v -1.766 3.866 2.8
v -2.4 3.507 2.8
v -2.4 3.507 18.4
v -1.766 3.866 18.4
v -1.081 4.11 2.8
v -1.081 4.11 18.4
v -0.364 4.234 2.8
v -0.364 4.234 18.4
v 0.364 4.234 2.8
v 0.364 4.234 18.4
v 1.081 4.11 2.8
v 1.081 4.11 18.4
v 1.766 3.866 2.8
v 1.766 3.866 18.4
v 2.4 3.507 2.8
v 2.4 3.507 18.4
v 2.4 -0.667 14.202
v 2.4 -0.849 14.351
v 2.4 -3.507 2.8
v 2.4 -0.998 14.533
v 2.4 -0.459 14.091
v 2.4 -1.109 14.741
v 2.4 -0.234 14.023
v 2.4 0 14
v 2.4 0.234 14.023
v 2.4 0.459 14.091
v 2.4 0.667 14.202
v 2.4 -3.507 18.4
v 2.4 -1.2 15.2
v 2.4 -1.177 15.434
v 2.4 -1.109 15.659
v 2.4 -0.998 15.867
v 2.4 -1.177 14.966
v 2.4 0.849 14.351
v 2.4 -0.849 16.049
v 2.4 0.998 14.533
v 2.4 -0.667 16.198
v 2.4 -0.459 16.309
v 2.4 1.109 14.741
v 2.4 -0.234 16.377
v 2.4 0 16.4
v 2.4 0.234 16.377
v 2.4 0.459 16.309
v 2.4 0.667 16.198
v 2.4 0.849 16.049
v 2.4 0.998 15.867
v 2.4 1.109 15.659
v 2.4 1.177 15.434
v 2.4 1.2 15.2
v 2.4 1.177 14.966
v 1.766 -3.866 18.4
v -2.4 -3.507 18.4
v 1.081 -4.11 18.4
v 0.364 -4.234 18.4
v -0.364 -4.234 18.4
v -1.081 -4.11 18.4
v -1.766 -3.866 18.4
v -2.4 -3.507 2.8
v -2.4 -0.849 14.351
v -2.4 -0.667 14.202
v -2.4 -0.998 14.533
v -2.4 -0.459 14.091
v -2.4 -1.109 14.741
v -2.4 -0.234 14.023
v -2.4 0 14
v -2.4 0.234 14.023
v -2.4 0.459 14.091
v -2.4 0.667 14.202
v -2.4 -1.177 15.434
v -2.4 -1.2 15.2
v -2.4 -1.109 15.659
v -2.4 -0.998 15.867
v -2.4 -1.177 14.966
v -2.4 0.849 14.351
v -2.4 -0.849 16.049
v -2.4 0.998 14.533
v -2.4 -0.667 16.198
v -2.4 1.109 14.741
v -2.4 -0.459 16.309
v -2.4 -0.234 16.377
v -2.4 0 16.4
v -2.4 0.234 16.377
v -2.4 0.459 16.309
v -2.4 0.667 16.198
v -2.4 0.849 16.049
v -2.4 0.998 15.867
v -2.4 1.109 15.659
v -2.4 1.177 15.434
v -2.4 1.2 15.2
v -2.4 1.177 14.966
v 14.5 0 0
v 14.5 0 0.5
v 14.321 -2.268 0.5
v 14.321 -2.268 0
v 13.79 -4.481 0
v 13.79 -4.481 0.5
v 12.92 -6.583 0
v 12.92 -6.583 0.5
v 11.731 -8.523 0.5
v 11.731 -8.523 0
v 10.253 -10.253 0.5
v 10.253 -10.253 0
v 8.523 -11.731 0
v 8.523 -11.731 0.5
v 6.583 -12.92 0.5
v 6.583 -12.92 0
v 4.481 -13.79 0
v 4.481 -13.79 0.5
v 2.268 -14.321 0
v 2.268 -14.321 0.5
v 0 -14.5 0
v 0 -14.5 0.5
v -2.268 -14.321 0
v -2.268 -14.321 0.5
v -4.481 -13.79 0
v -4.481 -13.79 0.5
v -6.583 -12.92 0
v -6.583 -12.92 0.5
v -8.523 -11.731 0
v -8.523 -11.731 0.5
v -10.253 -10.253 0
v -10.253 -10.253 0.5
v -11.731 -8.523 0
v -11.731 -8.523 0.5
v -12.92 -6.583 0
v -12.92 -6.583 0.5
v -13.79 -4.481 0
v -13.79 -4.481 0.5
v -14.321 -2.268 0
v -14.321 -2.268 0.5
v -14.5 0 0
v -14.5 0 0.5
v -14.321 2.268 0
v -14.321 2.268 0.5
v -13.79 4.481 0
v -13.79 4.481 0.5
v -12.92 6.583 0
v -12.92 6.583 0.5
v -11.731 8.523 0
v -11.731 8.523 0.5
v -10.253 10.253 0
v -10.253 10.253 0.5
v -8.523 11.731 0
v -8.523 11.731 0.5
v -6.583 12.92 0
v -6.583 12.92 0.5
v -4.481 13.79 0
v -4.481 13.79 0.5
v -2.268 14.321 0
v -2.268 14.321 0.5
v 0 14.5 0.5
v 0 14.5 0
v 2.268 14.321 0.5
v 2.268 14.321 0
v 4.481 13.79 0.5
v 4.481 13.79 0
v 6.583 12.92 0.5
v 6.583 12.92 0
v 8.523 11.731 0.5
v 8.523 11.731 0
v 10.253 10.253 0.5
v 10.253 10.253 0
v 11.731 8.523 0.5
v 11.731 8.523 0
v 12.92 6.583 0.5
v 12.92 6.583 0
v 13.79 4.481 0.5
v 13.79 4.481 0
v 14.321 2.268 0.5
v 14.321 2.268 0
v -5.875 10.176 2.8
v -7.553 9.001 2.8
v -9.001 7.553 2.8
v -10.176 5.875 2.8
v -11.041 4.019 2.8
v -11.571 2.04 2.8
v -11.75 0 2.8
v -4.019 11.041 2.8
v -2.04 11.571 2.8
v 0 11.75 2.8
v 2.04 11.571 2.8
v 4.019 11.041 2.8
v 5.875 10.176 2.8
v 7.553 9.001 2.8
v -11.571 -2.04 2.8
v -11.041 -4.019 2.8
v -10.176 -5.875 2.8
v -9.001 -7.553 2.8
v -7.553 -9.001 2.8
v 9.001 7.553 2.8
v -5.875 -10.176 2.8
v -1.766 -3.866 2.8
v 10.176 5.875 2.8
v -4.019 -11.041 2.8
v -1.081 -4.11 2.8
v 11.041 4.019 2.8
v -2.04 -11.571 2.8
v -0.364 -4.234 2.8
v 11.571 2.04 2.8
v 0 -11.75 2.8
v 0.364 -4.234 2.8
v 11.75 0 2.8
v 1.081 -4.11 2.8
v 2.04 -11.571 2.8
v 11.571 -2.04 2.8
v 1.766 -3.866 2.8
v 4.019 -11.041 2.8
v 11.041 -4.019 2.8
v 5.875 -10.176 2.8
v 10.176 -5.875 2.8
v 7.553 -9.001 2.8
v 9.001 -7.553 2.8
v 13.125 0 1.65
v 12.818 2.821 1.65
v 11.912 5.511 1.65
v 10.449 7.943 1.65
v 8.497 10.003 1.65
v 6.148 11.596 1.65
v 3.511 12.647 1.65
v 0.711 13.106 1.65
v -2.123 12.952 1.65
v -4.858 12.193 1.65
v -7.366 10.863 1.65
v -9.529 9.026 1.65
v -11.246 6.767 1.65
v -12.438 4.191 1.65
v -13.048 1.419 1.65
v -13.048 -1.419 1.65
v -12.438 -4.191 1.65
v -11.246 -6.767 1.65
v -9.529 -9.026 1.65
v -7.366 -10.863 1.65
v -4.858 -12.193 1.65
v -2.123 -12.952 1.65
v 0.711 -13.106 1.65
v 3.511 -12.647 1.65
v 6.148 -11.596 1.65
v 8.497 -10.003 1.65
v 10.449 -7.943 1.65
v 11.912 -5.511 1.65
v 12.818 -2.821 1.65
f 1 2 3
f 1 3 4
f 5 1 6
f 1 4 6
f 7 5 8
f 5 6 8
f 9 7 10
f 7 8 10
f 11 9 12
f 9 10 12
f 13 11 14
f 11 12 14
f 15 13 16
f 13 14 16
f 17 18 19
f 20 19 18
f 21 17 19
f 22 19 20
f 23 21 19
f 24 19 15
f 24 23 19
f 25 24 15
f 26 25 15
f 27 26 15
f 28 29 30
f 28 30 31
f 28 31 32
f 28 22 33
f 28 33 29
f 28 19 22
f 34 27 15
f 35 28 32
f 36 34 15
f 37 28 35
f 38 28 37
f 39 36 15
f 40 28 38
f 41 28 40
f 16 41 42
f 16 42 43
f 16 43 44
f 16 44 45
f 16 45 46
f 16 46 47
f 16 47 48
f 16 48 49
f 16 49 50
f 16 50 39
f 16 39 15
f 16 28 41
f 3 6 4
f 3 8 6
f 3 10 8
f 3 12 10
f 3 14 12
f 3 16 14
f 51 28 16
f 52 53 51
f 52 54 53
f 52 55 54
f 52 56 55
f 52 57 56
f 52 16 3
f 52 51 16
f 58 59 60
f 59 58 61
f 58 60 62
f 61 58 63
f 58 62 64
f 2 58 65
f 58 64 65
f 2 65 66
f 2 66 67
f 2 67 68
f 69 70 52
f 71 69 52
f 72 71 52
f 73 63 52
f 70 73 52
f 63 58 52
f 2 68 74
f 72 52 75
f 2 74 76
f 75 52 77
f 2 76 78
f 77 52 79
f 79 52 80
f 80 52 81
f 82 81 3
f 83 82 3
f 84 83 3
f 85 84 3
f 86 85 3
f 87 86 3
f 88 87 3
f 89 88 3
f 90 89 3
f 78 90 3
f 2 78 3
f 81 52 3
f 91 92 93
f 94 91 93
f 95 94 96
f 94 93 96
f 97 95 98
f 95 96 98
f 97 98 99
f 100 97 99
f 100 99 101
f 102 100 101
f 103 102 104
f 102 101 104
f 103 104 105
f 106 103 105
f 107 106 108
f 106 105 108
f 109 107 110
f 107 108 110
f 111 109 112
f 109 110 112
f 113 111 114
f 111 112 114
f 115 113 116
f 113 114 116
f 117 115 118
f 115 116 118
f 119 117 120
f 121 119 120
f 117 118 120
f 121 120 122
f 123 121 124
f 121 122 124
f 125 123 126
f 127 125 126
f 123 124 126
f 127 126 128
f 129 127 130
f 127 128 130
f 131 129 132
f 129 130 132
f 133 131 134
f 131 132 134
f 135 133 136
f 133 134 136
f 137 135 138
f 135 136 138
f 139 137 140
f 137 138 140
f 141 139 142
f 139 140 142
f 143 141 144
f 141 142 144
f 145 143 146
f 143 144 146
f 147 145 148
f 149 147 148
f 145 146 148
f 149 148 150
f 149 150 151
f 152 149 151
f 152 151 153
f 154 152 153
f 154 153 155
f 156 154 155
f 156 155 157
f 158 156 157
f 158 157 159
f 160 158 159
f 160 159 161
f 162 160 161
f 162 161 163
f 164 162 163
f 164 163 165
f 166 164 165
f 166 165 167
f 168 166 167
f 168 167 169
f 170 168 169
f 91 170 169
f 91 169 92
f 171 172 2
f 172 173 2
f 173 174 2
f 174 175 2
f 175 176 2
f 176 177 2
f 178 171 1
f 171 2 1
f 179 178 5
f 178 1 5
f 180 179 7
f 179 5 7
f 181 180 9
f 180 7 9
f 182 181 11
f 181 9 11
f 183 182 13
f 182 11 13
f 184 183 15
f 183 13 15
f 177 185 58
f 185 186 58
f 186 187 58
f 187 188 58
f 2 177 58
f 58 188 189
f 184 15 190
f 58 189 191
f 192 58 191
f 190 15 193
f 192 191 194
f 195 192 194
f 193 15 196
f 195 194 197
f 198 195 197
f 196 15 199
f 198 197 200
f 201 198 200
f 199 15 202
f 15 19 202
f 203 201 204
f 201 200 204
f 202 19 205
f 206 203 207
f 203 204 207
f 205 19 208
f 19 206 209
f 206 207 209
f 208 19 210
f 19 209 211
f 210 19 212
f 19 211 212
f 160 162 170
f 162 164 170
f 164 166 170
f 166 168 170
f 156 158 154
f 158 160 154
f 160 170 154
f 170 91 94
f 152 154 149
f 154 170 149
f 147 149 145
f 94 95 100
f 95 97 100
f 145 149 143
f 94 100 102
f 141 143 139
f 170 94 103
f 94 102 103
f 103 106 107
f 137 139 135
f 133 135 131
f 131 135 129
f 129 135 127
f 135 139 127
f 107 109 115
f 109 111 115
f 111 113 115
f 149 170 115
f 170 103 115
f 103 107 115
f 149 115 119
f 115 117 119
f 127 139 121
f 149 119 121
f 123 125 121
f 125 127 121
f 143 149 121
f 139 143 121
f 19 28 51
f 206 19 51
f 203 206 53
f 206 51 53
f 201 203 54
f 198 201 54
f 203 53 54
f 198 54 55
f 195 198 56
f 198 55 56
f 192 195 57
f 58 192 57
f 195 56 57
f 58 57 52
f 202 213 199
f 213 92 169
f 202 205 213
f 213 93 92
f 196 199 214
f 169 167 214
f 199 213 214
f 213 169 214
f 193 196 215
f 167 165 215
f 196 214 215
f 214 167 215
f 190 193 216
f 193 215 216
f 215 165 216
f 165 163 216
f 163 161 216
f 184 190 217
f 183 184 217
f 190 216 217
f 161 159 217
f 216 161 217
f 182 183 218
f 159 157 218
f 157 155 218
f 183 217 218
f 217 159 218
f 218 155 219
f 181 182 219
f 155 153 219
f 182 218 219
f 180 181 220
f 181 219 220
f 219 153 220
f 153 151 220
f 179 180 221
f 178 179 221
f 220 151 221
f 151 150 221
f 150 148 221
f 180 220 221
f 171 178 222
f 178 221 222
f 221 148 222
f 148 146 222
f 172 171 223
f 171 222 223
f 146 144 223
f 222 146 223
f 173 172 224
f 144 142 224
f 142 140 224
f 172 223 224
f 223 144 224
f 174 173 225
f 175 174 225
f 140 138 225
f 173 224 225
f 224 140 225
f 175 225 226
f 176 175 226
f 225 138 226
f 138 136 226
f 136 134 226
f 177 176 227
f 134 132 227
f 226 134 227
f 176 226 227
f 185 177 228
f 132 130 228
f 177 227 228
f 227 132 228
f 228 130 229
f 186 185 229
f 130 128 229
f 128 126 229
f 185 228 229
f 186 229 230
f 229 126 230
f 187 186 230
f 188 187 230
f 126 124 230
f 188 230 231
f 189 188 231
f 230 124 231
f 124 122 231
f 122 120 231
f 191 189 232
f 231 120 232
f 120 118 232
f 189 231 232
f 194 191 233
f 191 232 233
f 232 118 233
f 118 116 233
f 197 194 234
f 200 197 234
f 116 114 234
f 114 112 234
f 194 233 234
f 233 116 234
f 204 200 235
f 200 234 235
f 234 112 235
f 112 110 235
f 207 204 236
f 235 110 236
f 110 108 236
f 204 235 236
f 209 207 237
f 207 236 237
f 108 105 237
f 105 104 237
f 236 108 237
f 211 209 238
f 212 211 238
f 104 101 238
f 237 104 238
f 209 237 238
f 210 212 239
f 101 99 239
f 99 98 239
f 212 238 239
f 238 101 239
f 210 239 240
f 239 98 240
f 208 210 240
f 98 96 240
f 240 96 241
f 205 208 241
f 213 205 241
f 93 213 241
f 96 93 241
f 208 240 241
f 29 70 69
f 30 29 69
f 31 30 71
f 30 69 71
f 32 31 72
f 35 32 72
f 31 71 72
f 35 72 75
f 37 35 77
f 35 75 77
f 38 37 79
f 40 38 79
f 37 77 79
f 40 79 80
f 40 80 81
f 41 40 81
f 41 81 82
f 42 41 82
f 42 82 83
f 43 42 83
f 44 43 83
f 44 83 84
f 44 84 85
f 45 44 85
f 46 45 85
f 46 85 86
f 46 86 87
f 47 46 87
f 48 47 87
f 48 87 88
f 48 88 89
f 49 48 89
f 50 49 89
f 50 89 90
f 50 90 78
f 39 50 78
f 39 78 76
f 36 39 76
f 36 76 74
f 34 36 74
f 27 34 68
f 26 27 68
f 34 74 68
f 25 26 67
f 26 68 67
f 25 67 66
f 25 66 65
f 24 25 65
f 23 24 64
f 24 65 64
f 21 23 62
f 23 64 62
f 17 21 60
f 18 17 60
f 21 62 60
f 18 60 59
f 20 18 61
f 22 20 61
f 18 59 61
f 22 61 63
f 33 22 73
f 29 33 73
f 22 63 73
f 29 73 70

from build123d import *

# Parameters (mm, degrees)
F0_W     = 4.25
F0_H     = 2.8
F0_W_2   = 10.25
F0_H_2   = 15.6
F4_W     = 4.8
F4_H     = 8.5
F5_DEPTH = 15.6
F6_R     = 1.2
F7_DEPTH = 16.901


with BuildPart() as f1:
    # F0 (on Front) → F1 (revolve)
    with BuildSketch(Plane.XZ):
        with Locations((2.125, 1.4)):
            Rectangle(F0_W, F0_H)
        with Locations((9.375, 1.4)):
            Rectangle(F0_W_2, F0_H)
        with Locations((2.125, 10.6)):
            Rectangle(F0_W, F0_H_2)
    revolve(axis=Axis((0, 0, 8.798894), (0, 0, -1)))

    # F2 (on Front) → F3 (revolve, cut)
    with BuildSketch(Plane.XZ):
        Polygon((14.5, 2.8), (11.75, 2.8), (14.5, 0.5), align=None)
    revolve(axis=Axis((0, 0, 11.99575), (0, 0, 1)), mode=Mode.SUBTRACT)

    # F4 (on face) → F5 (cut, through all)
    with BuildSketch(Plane.XY.offset(18.4)):
        with Locations((4.8, 0)):
            Rectangle(F4_W, F4_H)
        with Locations((-4.8, 0)):
            Rectangle(F4_W, F4_H)
    extrude(amount=-F5_DEPTH, mode=Mode.SUBTRACT)

    # F6 (on face) → F7 (cut, through all)
    with BuildSketch(Plane(origin=(-2.4, 0, 0), x_dir=(0, -1, 0), z_dir=(-1, 0, 0))):
        with Locations((0, 15.2)):
            Circle(F6_R)
    extrude(amount=-F7_DEPTH, mode=Mode.SUBTRACT)


solid = f1.part
